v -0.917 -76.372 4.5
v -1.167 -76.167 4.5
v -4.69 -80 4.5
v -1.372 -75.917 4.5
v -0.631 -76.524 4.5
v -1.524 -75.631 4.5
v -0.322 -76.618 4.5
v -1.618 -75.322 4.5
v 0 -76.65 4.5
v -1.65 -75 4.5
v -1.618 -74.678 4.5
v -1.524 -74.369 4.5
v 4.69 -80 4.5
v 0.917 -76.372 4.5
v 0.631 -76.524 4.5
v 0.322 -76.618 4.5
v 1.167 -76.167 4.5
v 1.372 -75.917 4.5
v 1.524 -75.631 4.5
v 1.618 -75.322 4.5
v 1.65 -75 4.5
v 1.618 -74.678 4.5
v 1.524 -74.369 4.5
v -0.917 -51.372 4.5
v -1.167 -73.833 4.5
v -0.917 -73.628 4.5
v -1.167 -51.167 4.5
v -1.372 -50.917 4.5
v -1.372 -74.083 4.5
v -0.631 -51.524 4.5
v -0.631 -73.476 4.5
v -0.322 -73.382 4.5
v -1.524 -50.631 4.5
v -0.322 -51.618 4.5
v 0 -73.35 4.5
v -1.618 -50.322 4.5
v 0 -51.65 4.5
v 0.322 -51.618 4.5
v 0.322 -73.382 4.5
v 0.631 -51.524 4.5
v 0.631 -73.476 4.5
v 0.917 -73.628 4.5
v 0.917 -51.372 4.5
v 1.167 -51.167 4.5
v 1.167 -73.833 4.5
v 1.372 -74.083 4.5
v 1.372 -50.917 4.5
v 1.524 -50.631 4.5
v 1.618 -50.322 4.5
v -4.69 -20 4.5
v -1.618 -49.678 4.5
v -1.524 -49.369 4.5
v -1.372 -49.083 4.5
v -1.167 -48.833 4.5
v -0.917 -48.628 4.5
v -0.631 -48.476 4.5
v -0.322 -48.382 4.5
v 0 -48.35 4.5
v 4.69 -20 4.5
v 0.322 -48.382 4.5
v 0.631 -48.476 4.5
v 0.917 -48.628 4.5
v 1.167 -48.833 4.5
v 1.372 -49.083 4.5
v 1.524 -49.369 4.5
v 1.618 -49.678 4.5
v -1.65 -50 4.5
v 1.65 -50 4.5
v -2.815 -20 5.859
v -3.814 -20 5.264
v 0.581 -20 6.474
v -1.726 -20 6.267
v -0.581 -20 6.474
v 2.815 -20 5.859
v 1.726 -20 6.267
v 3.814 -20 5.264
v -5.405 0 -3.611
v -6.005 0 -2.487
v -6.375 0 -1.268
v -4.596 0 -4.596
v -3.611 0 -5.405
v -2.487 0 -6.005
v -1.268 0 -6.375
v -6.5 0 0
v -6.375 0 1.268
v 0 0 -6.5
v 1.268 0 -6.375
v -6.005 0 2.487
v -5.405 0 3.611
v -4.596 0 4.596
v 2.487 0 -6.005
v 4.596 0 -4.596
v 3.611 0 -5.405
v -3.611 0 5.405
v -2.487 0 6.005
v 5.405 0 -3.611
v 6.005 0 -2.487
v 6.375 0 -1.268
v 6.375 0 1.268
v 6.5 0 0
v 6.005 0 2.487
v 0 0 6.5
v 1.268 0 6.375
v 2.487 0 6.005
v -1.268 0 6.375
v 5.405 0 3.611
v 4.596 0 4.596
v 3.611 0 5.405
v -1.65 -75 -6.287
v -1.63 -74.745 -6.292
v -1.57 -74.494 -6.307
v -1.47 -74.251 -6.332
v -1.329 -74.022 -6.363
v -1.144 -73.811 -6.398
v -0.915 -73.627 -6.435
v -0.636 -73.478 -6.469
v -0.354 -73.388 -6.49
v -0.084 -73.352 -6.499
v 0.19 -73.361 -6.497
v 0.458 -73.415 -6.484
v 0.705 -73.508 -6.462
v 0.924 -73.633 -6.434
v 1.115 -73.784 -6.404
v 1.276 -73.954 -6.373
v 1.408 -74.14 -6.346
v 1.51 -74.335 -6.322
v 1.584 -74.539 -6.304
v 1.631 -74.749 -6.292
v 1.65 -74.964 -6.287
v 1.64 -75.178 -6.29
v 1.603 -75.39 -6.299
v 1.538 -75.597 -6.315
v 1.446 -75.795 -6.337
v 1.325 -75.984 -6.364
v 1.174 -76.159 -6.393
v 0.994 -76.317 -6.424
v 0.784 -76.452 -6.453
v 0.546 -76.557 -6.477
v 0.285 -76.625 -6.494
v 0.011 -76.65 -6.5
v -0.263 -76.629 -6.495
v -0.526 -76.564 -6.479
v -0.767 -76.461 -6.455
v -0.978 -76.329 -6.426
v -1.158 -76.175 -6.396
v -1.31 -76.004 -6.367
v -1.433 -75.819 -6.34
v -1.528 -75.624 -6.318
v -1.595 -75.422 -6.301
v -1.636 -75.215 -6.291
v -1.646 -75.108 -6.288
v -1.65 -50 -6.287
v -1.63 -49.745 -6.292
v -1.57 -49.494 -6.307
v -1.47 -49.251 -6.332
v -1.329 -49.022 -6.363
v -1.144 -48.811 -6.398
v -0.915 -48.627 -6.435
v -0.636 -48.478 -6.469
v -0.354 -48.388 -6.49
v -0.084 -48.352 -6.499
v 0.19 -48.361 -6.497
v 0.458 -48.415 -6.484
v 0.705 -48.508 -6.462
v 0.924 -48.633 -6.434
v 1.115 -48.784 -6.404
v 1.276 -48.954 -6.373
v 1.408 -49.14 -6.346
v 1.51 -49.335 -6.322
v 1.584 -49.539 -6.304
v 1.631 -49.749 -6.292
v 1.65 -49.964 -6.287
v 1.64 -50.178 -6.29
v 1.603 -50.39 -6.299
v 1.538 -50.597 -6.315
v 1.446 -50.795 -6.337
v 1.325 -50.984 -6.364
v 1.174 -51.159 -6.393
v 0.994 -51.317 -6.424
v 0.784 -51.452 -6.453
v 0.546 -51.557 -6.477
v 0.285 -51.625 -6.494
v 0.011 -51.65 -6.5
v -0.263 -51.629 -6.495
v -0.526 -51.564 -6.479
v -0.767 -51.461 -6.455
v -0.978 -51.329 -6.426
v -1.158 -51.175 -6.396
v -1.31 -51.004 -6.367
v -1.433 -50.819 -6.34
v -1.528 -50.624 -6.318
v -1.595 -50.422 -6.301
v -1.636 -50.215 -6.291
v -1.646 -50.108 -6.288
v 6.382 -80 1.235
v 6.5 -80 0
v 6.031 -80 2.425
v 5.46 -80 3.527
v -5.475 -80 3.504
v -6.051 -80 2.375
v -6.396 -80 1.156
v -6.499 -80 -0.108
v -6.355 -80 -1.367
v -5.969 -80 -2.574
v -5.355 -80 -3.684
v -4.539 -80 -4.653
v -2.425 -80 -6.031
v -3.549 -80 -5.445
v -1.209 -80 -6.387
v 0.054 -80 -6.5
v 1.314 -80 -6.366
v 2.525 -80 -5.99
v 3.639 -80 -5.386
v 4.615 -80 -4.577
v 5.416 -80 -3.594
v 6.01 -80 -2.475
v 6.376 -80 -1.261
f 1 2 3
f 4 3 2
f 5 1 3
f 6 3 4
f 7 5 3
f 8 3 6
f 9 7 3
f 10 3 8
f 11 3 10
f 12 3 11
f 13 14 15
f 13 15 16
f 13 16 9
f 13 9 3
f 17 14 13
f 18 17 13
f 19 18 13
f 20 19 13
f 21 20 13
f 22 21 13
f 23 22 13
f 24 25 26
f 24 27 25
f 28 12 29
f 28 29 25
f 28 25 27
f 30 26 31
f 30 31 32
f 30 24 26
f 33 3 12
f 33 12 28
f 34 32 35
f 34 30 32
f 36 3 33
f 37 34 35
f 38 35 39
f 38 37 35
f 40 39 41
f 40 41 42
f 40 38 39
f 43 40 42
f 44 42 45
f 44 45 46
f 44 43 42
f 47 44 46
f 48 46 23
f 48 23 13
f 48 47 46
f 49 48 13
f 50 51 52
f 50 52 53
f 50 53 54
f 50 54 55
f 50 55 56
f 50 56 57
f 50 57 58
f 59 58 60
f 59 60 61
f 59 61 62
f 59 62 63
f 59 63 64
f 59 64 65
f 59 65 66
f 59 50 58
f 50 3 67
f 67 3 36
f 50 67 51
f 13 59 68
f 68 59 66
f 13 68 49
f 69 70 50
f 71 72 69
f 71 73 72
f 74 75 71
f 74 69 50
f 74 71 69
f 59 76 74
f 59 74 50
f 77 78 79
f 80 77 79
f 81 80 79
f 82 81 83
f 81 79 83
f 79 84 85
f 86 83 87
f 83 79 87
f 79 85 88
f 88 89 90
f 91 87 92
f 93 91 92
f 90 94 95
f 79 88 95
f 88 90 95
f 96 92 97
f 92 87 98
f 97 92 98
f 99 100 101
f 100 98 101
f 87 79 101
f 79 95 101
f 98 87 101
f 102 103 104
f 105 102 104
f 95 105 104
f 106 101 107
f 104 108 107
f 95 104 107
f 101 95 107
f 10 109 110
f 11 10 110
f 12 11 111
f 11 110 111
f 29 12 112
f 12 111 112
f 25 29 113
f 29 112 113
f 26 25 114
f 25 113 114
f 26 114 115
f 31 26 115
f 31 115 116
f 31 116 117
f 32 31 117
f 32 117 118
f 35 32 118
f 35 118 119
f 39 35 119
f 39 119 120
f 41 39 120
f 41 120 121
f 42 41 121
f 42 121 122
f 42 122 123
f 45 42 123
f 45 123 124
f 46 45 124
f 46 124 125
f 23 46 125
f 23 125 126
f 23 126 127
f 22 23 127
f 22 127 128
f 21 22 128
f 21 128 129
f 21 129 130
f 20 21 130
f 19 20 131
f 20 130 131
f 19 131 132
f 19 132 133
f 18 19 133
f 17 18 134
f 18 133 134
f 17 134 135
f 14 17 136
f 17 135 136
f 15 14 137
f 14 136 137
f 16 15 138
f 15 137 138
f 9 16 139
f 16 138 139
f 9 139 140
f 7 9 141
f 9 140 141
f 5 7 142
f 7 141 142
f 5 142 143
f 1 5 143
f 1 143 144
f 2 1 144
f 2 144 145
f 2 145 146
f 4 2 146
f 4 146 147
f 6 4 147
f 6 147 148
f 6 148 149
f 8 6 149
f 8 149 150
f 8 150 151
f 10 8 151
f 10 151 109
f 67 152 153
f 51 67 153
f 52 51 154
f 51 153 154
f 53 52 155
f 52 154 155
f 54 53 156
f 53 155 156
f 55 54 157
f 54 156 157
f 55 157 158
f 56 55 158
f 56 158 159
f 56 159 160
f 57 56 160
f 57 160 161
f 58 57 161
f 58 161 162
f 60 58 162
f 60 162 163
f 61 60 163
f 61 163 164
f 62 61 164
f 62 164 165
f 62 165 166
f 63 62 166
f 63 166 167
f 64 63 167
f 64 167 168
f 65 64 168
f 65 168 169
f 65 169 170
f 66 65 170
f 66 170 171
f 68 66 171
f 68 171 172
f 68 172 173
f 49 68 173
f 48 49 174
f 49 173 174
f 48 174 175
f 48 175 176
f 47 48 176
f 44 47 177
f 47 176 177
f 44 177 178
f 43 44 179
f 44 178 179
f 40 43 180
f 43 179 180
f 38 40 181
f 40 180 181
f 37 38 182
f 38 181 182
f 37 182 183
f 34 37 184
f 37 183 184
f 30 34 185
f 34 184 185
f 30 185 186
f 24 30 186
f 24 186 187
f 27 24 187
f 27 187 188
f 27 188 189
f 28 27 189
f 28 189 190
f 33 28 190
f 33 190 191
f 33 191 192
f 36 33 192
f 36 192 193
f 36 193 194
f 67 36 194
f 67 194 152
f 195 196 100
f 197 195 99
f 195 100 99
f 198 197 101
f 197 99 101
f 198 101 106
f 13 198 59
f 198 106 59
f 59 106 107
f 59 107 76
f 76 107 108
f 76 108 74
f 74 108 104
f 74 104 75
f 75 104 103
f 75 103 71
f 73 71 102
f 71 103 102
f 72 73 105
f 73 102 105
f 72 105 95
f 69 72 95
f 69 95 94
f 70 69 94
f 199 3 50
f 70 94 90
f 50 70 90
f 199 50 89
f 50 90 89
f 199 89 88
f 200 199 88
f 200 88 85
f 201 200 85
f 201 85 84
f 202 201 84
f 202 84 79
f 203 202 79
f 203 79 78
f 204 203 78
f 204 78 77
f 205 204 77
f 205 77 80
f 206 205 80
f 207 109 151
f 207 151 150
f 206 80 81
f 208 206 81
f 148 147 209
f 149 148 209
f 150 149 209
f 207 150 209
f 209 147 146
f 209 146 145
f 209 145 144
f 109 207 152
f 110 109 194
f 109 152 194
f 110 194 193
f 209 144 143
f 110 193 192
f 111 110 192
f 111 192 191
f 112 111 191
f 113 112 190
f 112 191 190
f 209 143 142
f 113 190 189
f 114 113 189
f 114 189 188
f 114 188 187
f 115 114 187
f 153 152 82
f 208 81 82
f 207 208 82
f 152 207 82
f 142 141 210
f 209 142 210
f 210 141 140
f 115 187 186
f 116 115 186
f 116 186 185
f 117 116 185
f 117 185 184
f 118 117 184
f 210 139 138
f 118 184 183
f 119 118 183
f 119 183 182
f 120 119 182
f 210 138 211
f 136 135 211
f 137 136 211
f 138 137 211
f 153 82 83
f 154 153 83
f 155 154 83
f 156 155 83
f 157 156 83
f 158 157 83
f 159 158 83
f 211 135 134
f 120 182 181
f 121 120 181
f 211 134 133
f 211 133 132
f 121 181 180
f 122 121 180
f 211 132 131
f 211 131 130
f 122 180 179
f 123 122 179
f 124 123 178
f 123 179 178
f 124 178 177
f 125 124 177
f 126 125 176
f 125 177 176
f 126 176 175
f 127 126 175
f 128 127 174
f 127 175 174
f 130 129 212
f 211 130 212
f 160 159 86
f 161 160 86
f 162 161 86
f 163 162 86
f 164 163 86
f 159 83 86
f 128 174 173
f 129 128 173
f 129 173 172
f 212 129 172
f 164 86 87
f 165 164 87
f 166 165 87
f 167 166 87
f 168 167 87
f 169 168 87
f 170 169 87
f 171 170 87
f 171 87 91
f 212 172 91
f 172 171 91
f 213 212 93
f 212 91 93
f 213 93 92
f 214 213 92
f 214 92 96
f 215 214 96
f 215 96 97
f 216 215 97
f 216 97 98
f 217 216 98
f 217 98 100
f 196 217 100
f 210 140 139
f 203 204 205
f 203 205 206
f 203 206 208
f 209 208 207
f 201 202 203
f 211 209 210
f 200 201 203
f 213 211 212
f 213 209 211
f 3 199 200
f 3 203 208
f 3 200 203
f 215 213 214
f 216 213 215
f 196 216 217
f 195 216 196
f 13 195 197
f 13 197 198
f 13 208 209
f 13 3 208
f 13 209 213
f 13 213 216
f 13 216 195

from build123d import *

# Parameters (mm, degrees)
F0_R     = 6.5
F1_DEPTH = 80
F3_W     = 34.3981292099
F3_H     = 76.4677333832
F4_DEPTH = 2
F6_D     = 3.3


with BuildPart() as f1:
    # F0 (on Front) → F1 (new body)
    with BuildSketch(Plane.XZ):
        Circle(F0_R)
    extrude(amount=F1_DEPTH)

    # F3 (on offset) → F4 (cut)
    with BuildSketch(Plane.XY.offset(6.5)):
        with Locations((-0.0220080838, -58.2338666916)):
            Rectangle(F3_W, F3_H)
    extrude(amount=-F4_DEPTH, mode=Mode.SUBTRACT)

    # F6 (through all)
    with Locations(Plane.XY.offset(4.5)):
        with Locations((0, -50), (0, -75)):
            Hole(F6_D / 2)


solid = f1.part
